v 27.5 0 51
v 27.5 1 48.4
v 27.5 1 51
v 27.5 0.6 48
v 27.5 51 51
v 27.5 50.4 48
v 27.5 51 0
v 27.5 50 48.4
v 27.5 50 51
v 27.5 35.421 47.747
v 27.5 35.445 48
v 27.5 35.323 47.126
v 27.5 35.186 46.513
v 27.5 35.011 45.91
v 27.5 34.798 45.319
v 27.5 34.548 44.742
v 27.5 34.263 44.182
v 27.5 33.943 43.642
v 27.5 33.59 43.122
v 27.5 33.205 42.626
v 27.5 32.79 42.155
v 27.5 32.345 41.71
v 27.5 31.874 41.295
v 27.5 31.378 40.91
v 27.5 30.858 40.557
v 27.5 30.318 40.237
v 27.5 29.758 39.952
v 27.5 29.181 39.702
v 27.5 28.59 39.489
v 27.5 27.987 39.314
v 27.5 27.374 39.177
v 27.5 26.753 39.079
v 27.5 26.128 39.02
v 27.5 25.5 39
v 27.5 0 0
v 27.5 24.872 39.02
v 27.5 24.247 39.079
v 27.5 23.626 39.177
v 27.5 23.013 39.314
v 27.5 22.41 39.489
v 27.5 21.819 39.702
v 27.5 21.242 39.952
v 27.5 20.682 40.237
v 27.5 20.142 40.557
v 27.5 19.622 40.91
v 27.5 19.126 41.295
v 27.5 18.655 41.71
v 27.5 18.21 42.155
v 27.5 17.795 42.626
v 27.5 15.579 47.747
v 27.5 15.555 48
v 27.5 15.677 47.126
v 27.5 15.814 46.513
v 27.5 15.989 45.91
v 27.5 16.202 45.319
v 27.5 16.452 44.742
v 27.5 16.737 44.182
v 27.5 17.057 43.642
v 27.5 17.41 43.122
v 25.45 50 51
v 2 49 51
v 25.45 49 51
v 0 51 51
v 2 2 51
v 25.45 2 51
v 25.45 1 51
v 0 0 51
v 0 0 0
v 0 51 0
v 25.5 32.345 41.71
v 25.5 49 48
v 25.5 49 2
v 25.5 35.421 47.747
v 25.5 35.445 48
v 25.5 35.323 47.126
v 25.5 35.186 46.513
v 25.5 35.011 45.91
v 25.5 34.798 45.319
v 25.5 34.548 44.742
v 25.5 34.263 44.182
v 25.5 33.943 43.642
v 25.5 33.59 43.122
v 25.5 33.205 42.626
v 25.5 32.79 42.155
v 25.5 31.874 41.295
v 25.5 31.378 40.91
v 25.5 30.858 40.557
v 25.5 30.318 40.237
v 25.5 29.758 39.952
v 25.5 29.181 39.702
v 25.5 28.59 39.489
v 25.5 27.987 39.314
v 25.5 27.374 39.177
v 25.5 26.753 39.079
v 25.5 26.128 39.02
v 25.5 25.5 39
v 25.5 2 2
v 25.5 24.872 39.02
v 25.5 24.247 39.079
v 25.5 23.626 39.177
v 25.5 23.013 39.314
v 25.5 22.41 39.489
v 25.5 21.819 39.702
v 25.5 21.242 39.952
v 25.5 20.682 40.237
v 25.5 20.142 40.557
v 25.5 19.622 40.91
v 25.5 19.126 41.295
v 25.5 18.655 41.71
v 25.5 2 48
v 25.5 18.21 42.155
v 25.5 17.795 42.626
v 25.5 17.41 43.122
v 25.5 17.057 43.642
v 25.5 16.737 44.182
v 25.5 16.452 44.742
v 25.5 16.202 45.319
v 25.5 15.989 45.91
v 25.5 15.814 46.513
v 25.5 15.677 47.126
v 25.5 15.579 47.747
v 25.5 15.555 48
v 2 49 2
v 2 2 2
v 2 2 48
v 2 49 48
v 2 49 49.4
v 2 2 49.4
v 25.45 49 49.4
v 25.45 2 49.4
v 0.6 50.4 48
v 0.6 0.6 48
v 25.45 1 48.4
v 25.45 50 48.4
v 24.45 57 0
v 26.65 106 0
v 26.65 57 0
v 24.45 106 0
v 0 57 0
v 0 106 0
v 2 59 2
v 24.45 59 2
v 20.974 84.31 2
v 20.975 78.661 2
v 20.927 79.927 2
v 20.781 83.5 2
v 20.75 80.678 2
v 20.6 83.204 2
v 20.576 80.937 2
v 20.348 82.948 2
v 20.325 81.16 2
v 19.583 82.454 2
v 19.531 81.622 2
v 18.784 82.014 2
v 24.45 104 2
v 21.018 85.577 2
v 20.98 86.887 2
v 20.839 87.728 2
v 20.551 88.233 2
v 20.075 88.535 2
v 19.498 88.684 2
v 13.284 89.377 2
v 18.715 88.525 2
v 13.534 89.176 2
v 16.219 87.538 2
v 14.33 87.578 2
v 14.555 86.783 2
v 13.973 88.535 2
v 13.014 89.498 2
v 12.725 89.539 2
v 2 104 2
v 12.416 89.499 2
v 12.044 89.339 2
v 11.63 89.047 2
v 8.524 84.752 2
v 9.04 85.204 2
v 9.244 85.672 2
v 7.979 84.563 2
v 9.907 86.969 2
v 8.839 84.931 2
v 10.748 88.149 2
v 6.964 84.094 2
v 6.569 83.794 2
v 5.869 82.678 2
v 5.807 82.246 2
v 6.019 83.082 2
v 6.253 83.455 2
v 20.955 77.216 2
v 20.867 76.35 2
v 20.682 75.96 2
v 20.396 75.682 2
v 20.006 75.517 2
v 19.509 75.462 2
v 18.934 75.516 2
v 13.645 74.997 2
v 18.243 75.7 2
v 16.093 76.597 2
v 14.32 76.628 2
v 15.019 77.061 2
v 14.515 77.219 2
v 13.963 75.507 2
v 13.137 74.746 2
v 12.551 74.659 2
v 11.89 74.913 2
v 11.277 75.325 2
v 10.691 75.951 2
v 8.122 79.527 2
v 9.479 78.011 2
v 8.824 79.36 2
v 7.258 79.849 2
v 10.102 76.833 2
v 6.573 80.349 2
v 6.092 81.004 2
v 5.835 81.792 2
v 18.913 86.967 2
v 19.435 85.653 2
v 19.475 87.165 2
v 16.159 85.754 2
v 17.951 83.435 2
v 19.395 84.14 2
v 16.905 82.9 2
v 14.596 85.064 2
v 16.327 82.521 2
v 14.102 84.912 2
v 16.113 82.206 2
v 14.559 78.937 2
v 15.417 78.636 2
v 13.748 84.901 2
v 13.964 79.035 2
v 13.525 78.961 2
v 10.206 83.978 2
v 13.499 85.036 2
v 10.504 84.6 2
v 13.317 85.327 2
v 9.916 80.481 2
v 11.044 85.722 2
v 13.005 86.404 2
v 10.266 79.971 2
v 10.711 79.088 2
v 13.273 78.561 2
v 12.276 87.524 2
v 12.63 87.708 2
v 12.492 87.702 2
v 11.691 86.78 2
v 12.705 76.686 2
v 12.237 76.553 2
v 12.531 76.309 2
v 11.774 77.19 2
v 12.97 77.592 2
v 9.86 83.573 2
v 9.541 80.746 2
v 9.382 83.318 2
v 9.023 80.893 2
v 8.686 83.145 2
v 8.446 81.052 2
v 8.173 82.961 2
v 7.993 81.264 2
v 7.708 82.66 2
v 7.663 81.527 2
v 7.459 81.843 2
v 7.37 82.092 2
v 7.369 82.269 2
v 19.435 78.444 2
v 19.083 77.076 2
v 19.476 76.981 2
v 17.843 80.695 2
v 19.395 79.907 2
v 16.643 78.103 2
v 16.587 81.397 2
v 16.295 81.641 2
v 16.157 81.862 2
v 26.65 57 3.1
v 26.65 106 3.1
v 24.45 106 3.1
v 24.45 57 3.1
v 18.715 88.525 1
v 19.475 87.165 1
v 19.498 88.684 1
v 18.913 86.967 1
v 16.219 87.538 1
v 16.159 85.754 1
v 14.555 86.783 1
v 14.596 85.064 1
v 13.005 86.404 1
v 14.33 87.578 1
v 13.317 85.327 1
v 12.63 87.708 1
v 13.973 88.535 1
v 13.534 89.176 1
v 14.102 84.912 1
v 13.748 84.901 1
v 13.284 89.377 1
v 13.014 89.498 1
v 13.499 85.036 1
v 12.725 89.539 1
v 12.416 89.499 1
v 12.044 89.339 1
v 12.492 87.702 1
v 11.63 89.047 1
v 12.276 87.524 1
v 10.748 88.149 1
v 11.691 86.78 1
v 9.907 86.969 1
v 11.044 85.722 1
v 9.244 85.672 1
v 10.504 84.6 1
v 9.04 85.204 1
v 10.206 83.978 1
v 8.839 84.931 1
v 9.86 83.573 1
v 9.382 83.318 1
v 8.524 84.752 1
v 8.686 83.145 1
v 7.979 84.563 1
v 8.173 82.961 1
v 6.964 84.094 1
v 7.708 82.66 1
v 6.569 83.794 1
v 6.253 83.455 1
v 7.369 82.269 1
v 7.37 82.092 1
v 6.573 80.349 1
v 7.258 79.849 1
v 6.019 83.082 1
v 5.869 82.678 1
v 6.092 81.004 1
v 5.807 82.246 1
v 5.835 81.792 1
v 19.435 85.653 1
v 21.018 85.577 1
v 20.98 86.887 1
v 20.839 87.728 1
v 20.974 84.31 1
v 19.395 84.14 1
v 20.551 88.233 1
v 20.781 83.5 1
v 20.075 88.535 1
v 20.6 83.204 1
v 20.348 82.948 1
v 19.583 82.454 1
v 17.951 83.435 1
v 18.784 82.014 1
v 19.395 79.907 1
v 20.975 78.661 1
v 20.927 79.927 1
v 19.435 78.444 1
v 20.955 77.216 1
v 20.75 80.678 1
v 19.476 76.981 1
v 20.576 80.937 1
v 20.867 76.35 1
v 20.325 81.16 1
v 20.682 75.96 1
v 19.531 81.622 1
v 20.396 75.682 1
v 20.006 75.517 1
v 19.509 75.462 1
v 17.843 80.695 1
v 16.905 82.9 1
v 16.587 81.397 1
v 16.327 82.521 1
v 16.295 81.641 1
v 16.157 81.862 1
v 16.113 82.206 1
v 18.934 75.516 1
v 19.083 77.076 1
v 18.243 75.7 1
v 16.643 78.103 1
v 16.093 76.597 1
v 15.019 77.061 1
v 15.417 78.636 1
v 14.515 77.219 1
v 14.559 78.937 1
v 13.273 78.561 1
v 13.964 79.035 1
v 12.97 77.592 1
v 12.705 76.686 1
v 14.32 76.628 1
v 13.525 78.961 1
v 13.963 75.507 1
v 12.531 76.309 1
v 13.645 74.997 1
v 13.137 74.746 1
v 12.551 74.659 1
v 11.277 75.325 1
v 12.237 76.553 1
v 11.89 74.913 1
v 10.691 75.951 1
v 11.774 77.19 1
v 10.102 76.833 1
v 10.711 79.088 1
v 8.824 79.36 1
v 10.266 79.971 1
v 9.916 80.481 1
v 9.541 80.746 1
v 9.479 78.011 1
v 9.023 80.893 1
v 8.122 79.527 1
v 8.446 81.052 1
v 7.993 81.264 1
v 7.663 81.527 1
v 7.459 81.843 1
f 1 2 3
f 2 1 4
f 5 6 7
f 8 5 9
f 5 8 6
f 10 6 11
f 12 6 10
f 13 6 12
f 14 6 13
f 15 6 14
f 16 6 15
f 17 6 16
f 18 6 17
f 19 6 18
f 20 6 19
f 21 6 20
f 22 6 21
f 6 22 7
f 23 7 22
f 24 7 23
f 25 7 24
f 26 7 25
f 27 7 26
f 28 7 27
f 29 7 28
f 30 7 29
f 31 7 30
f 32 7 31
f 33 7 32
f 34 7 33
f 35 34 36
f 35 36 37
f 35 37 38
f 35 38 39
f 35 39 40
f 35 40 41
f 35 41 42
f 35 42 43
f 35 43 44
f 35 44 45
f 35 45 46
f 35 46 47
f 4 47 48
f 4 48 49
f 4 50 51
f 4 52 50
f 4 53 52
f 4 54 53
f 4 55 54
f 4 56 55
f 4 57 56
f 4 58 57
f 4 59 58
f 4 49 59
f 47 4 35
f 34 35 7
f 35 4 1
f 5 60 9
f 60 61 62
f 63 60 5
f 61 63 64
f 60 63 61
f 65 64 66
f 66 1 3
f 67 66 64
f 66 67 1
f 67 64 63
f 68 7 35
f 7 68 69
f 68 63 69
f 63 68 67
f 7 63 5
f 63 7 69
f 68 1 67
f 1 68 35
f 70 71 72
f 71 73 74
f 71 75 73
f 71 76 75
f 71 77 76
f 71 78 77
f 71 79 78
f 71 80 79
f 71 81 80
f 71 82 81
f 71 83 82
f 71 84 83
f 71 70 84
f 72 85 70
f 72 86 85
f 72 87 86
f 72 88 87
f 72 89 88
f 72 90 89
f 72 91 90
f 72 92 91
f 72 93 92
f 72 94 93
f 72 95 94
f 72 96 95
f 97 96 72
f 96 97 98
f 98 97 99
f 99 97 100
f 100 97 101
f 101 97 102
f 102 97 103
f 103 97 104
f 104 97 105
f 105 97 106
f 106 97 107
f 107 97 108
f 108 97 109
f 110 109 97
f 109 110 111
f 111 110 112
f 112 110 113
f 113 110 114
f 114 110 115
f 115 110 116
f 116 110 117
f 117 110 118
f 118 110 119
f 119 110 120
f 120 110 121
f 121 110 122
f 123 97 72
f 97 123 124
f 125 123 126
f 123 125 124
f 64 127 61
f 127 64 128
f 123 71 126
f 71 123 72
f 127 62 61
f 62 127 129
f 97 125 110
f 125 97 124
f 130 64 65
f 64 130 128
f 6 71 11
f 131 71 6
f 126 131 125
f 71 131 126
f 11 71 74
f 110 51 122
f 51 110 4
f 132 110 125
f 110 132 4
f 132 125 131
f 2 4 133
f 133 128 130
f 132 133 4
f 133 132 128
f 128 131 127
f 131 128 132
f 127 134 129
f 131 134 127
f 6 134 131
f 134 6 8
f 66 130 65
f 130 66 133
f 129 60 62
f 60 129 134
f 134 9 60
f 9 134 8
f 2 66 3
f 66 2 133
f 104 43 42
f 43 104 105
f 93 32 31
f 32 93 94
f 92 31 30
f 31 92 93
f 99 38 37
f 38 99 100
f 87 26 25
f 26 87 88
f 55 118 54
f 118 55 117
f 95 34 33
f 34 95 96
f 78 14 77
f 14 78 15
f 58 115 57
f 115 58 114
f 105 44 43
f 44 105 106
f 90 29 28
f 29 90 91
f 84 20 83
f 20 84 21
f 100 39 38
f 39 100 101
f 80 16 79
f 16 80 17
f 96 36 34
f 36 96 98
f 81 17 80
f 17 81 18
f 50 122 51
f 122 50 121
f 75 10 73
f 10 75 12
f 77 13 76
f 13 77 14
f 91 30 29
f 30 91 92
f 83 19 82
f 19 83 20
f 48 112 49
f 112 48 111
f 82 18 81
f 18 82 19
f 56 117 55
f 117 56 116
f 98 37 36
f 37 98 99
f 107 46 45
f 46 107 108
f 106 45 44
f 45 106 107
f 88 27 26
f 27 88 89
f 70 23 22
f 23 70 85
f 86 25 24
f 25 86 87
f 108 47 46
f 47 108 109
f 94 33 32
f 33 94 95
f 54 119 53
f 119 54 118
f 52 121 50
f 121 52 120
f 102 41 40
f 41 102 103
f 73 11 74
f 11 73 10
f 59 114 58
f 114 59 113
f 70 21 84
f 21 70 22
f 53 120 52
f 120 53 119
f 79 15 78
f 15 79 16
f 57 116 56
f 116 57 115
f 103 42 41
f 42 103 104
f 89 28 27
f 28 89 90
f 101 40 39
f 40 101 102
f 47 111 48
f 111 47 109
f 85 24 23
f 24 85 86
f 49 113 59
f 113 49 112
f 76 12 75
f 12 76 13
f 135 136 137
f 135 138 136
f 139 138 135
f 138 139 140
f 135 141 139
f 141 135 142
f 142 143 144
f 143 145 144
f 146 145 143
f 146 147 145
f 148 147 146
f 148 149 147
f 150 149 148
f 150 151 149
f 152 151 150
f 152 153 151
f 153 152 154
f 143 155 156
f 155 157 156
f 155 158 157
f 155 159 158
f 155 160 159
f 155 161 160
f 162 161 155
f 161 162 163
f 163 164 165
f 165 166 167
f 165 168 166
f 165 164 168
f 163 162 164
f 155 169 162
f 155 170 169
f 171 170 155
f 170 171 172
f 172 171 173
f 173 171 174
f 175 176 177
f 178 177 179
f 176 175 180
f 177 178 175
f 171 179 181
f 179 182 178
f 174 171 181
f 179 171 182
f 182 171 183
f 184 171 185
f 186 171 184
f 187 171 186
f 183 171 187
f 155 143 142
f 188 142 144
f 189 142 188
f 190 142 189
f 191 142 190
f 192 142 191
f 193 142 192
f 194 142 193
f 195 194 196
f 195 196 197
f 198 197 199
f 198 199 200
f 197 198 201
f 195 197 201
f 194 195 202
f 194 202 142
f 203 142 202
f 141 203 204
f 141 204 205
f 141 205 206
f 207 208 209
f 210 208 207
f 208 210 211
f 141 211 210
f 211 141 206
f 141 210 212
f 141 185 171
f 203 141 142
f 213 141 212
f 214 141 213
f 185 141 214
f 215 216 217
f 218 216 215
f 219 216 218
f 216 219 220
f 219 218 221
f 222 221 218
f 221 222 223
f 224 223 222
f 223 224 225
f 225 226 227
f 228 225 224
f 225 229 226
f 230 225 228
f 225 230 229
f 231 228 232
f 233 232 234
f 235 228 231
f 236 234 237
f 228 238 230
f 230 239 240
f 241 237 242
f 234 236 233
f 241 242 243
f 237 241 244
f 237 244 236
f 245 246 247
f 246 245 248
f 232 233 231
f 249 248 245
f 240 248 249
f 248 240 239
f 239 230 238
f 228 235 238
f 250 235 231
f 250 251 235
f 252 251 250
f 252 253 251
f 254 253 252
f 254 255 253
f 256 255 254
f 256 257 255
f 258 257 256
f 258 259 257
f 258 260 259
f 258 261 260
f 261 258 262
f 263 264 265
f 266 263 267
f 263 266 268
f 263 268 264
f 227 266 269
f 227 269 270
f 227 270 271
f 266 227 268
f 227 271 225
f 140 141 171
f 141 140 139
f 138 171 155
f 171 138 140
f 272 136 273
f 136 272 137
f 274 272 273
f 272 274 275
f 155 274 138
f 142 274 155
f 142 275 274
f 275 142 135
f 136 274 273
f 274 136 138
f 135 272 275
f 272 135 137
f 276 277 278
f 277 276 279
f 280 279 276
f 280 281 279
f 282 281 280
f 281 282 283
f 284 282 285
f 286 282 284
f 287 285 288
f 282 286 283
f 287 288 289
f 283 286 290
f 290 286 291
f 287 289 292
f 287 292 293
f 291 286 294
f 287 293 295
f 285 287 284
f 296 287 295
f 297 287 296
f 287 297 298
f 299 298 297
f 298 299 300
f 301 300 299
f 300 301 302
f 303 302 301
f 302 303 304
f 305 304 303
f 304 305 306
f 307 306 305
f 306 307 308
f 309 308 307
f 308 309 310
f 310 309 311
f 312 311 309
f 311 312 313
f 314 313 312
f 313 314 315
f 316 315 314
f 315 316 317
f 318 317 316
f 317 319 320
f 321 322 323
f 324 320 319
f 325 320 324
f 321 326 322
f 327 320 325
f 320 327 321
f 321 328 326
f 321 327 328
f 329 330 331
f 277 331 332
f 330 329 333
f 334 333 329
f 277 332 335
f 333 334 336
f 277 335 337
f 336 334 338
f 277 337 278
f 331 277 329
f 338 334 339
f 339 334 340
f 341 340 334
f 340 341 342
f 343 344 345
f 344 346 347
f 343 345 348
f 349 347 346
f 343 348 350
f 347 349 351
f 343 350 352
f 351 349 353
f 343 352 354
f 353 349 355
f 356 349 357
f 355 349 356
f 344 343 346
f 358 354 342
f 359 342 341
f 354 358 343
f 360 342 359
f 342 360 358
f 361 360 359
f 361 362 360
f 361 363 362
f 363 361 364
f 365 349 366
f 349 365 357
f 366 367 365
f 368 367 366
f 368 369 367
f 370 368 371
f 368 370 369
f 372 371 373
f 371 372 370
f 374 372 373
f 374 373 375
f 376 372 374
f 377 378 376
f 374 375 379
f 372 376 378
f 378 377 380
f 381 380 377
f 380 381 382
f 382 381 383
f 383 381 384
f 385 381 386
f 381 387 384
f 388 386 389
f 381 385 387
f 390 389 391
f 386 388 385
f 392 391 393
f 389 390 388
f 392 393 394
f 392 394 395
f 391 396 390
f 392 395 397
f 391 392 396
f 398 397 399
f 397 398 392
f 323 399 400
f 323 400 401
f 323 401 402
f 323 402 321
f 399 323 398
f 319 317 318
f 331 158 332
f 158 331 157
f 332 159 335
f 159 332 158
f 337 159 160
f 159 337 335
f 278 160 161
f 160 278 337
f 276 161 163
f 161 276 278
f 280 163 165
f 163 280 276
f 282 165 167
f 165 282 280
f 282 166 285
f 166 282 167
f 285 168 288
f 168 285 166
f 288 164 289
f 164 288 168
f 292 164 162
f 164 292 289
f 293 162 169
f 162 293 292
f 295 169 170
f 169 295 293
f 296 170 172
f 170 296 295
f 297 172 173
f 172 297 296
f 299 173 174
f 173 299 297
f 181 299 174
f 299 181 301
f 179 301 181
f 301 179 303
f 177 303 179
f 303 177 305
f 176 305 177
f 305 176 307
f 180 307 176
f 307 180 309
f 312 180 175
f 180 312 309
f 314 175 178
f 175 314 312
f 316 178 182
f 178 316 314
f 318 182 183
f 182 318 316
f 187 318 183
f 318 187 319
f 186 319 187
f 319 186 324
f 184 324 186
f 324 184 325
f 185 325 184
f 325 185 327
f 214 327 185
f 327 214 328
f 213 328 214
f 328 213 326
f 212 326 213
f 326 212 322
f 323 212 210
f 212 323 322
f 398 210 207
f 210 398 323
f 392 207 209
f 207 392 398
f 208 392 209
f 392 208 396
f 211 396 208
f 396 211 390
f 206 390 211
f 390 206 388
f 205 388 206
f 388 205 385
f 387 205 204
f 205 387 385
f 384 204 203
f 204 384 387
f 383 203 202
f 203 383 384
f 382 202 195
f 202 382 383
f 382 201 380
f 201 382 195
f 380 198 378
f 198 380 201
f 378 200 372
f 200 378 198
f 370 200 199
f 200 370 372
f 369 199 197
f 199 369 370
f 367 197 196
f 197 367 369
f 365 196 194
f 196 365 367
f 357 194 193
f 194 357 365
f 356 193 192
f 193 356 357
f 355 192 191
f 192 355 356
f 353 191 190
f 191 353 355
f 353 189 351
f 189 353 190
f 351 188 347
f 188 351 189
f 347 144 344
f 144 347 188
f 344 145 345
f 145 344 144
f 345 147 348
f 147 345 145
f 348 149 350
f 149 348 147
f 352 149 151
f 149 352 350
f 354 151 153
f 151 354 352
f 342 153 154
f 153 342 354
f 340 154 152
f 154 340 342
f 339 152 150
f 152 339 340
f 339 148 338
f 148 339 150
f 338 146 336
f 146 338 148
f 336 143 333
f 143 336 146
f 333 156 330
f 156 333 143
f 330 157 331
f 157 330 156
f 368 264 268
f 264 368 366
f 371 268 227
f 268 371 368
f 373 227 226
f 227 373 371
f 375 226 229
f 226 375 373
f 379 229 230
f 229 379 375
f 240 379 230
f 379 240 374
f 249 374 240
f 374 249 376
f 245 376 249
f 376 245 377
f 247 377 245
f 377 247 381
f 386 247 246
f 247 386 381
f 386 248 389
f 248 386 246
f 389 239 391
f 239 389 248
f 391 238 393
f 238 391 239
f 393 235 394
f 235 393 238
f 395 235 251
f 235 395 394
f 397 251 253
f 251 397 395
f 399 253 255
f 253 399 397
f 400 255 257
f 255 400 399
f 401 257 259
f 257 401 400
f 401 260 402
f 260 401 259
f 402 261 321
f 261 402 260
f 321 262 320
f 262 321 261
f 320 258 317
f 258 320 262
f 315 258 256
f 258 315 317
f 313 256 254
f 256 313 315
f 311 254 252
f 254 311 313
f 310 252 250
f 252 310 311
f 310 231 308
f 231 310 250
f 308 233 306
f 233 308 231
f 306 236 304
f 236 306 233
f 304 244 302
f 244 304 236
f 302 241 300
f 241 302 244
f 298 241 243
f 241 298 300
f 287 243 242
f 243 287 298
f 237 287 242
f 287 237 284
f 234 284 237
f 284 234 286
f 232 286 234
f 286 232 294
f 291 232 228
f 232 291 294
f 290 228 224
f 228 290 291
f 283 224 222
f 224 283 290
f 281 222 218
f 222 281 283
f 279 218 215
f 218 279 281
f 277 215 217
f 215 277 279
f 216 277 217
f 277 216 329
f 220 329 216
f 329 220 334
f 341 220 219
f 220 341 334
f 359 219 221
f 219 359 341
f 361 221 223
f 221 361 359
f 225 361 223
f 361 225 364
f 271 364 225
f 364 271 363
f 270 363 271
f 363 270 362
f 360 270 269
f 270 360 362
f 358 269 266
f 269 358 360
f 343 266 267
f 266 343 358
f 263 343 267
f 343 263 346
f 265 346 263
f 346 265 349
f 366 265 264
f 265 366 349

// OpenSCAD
// file: carcassonne_box.scad
/**
 * @file carcassonne_box.scad
 * @author Conlan Wesson
 * Template for Carcossonne boxes.
 * @copyright Creative Commons Attribution-NonCommercial-ShareAlike 4.0
 */

mm = 1;
cm = 10*mm;

width = 47*mm;
thick = 2.5*mm;
wall = 2*mm;

/**
 * Lid for box.
 * @param count Number of cards.
 * @param columns Number of columns.
 * @param icon Path to icon DXF file.
 * @param rot Icon rotation in degrees.
 * @param mult Icon scale.
 * @param xoff X-offset of icon from center.
 * @param yoff Y-offset of icon from center.
 */
module carcassonne_lid(count, columns=1, icon=false, rot=0, mult=1, xoff=0, yoff=0, g=0){
	length = (thick * count) + ((width/2) - ((thick * count) % (width/2)));
	w = length+(1.5*wall)+.1;
	l = (width*columns)+wall;
	h = wall;
	d = 2;

	CubePoints = [
		[ 0-g, 0-g,   0 ],  //0
		[ w+g, 0-g,   0 ],  //1
		[ w+g, l+g,   0 ],  //2
		[ 0-g, l+g,   0 ],  //3
		[   d,   d, h+g ],  //4
		[   w,   d, h+g ],  //5
		[   w, l-d, h+g ],  //6
		[   d, l-d, h+g ]   //7
	];
	
	CubeFaces = [
		[0,1,2,3],  // bottom
		[4,5,1,0],  // front
		[7,6,5,4],  // top
		[5,6,2,1],  // right
		[6,7,3,2],  // back
		[7,4,0,3]   // left
	];
	
	
	difference(){
		union(){
			polyhedron( CubePoints, CubeFaces );
			translate([w-wall-.15,0,0]) cube([wall+.2,l, (1.5*wall)+.1]);
		}
		if(icon){
			translate([w/2+xoff,l/3+yoff,h-(wall/2)]){
				linear_extrude(height=(wall)+.1){
					rotate(rot) scale(mult) import(icon);
				}
			}
		}
	}
}

/**
 * Carcassonne card box.
 * @param count Number of cards.
 * @param dividers Array of divider positions.
 * @param columns Number of columns.
 */
module carcassonne_box(count, dividers=[], columns=1){
	length = (thick * count) + ((width/2) - ((thick * count) % (width/2)));
	difference(){
		union(){
			difference(){
				// Outer walls
				cube([length+(2*wall), (width*columns)+(2*wall), width+(2*wall)]);
				// Cavity
				translate([wall, wall, wall]){
					cube([length, width*columns, (width+wall)+.1]);
				}
			}
			// Dividers
			for(col = [0:columns-1]){
				for(div = dividers[col]){
					translate([(div*(width/2))+(wall/2), width*col+wall, 0]) cube([wall/2, width, width-(2*wall)]);
				}
				if(col > 0){
					translate([0, width*col+(wall/2), 0]) cube([length+(2*wall), wall/2, width-(2*wall)]);
				}
			}
		}
		union(){
			// Notch
			for(col = [0:columns-1]){
				translate([wall, wall+(width*col), wall]){
					translate([0, width/2, width])
					rotate([0, 90, 0]){
						cylinder(r=10, h=length+(2*wall), $fn=100);
					}
				}
			}
			// Track
			translate([wall/2,wall/2,width+wall/2]) carcassonne_lid(count, columns, g=0.4);
		}
	}
}
// main file
/**
 * @file phantom.scad
 * @author Conlan Wesson
 * Count, King, and Robber Carcossonne box.
 * @copyright Creative Commons Attribution-NonCommercial-ShareAlike 4.0
 */

include <carcassonne_box.scad>

count = 6;

carcassonne_box(count);
translate([0,width+10,0]) carcassonne_lid(count, icon="phantom.dxf", rot=90, mult=0.5, xoff=8, yoff=1);
